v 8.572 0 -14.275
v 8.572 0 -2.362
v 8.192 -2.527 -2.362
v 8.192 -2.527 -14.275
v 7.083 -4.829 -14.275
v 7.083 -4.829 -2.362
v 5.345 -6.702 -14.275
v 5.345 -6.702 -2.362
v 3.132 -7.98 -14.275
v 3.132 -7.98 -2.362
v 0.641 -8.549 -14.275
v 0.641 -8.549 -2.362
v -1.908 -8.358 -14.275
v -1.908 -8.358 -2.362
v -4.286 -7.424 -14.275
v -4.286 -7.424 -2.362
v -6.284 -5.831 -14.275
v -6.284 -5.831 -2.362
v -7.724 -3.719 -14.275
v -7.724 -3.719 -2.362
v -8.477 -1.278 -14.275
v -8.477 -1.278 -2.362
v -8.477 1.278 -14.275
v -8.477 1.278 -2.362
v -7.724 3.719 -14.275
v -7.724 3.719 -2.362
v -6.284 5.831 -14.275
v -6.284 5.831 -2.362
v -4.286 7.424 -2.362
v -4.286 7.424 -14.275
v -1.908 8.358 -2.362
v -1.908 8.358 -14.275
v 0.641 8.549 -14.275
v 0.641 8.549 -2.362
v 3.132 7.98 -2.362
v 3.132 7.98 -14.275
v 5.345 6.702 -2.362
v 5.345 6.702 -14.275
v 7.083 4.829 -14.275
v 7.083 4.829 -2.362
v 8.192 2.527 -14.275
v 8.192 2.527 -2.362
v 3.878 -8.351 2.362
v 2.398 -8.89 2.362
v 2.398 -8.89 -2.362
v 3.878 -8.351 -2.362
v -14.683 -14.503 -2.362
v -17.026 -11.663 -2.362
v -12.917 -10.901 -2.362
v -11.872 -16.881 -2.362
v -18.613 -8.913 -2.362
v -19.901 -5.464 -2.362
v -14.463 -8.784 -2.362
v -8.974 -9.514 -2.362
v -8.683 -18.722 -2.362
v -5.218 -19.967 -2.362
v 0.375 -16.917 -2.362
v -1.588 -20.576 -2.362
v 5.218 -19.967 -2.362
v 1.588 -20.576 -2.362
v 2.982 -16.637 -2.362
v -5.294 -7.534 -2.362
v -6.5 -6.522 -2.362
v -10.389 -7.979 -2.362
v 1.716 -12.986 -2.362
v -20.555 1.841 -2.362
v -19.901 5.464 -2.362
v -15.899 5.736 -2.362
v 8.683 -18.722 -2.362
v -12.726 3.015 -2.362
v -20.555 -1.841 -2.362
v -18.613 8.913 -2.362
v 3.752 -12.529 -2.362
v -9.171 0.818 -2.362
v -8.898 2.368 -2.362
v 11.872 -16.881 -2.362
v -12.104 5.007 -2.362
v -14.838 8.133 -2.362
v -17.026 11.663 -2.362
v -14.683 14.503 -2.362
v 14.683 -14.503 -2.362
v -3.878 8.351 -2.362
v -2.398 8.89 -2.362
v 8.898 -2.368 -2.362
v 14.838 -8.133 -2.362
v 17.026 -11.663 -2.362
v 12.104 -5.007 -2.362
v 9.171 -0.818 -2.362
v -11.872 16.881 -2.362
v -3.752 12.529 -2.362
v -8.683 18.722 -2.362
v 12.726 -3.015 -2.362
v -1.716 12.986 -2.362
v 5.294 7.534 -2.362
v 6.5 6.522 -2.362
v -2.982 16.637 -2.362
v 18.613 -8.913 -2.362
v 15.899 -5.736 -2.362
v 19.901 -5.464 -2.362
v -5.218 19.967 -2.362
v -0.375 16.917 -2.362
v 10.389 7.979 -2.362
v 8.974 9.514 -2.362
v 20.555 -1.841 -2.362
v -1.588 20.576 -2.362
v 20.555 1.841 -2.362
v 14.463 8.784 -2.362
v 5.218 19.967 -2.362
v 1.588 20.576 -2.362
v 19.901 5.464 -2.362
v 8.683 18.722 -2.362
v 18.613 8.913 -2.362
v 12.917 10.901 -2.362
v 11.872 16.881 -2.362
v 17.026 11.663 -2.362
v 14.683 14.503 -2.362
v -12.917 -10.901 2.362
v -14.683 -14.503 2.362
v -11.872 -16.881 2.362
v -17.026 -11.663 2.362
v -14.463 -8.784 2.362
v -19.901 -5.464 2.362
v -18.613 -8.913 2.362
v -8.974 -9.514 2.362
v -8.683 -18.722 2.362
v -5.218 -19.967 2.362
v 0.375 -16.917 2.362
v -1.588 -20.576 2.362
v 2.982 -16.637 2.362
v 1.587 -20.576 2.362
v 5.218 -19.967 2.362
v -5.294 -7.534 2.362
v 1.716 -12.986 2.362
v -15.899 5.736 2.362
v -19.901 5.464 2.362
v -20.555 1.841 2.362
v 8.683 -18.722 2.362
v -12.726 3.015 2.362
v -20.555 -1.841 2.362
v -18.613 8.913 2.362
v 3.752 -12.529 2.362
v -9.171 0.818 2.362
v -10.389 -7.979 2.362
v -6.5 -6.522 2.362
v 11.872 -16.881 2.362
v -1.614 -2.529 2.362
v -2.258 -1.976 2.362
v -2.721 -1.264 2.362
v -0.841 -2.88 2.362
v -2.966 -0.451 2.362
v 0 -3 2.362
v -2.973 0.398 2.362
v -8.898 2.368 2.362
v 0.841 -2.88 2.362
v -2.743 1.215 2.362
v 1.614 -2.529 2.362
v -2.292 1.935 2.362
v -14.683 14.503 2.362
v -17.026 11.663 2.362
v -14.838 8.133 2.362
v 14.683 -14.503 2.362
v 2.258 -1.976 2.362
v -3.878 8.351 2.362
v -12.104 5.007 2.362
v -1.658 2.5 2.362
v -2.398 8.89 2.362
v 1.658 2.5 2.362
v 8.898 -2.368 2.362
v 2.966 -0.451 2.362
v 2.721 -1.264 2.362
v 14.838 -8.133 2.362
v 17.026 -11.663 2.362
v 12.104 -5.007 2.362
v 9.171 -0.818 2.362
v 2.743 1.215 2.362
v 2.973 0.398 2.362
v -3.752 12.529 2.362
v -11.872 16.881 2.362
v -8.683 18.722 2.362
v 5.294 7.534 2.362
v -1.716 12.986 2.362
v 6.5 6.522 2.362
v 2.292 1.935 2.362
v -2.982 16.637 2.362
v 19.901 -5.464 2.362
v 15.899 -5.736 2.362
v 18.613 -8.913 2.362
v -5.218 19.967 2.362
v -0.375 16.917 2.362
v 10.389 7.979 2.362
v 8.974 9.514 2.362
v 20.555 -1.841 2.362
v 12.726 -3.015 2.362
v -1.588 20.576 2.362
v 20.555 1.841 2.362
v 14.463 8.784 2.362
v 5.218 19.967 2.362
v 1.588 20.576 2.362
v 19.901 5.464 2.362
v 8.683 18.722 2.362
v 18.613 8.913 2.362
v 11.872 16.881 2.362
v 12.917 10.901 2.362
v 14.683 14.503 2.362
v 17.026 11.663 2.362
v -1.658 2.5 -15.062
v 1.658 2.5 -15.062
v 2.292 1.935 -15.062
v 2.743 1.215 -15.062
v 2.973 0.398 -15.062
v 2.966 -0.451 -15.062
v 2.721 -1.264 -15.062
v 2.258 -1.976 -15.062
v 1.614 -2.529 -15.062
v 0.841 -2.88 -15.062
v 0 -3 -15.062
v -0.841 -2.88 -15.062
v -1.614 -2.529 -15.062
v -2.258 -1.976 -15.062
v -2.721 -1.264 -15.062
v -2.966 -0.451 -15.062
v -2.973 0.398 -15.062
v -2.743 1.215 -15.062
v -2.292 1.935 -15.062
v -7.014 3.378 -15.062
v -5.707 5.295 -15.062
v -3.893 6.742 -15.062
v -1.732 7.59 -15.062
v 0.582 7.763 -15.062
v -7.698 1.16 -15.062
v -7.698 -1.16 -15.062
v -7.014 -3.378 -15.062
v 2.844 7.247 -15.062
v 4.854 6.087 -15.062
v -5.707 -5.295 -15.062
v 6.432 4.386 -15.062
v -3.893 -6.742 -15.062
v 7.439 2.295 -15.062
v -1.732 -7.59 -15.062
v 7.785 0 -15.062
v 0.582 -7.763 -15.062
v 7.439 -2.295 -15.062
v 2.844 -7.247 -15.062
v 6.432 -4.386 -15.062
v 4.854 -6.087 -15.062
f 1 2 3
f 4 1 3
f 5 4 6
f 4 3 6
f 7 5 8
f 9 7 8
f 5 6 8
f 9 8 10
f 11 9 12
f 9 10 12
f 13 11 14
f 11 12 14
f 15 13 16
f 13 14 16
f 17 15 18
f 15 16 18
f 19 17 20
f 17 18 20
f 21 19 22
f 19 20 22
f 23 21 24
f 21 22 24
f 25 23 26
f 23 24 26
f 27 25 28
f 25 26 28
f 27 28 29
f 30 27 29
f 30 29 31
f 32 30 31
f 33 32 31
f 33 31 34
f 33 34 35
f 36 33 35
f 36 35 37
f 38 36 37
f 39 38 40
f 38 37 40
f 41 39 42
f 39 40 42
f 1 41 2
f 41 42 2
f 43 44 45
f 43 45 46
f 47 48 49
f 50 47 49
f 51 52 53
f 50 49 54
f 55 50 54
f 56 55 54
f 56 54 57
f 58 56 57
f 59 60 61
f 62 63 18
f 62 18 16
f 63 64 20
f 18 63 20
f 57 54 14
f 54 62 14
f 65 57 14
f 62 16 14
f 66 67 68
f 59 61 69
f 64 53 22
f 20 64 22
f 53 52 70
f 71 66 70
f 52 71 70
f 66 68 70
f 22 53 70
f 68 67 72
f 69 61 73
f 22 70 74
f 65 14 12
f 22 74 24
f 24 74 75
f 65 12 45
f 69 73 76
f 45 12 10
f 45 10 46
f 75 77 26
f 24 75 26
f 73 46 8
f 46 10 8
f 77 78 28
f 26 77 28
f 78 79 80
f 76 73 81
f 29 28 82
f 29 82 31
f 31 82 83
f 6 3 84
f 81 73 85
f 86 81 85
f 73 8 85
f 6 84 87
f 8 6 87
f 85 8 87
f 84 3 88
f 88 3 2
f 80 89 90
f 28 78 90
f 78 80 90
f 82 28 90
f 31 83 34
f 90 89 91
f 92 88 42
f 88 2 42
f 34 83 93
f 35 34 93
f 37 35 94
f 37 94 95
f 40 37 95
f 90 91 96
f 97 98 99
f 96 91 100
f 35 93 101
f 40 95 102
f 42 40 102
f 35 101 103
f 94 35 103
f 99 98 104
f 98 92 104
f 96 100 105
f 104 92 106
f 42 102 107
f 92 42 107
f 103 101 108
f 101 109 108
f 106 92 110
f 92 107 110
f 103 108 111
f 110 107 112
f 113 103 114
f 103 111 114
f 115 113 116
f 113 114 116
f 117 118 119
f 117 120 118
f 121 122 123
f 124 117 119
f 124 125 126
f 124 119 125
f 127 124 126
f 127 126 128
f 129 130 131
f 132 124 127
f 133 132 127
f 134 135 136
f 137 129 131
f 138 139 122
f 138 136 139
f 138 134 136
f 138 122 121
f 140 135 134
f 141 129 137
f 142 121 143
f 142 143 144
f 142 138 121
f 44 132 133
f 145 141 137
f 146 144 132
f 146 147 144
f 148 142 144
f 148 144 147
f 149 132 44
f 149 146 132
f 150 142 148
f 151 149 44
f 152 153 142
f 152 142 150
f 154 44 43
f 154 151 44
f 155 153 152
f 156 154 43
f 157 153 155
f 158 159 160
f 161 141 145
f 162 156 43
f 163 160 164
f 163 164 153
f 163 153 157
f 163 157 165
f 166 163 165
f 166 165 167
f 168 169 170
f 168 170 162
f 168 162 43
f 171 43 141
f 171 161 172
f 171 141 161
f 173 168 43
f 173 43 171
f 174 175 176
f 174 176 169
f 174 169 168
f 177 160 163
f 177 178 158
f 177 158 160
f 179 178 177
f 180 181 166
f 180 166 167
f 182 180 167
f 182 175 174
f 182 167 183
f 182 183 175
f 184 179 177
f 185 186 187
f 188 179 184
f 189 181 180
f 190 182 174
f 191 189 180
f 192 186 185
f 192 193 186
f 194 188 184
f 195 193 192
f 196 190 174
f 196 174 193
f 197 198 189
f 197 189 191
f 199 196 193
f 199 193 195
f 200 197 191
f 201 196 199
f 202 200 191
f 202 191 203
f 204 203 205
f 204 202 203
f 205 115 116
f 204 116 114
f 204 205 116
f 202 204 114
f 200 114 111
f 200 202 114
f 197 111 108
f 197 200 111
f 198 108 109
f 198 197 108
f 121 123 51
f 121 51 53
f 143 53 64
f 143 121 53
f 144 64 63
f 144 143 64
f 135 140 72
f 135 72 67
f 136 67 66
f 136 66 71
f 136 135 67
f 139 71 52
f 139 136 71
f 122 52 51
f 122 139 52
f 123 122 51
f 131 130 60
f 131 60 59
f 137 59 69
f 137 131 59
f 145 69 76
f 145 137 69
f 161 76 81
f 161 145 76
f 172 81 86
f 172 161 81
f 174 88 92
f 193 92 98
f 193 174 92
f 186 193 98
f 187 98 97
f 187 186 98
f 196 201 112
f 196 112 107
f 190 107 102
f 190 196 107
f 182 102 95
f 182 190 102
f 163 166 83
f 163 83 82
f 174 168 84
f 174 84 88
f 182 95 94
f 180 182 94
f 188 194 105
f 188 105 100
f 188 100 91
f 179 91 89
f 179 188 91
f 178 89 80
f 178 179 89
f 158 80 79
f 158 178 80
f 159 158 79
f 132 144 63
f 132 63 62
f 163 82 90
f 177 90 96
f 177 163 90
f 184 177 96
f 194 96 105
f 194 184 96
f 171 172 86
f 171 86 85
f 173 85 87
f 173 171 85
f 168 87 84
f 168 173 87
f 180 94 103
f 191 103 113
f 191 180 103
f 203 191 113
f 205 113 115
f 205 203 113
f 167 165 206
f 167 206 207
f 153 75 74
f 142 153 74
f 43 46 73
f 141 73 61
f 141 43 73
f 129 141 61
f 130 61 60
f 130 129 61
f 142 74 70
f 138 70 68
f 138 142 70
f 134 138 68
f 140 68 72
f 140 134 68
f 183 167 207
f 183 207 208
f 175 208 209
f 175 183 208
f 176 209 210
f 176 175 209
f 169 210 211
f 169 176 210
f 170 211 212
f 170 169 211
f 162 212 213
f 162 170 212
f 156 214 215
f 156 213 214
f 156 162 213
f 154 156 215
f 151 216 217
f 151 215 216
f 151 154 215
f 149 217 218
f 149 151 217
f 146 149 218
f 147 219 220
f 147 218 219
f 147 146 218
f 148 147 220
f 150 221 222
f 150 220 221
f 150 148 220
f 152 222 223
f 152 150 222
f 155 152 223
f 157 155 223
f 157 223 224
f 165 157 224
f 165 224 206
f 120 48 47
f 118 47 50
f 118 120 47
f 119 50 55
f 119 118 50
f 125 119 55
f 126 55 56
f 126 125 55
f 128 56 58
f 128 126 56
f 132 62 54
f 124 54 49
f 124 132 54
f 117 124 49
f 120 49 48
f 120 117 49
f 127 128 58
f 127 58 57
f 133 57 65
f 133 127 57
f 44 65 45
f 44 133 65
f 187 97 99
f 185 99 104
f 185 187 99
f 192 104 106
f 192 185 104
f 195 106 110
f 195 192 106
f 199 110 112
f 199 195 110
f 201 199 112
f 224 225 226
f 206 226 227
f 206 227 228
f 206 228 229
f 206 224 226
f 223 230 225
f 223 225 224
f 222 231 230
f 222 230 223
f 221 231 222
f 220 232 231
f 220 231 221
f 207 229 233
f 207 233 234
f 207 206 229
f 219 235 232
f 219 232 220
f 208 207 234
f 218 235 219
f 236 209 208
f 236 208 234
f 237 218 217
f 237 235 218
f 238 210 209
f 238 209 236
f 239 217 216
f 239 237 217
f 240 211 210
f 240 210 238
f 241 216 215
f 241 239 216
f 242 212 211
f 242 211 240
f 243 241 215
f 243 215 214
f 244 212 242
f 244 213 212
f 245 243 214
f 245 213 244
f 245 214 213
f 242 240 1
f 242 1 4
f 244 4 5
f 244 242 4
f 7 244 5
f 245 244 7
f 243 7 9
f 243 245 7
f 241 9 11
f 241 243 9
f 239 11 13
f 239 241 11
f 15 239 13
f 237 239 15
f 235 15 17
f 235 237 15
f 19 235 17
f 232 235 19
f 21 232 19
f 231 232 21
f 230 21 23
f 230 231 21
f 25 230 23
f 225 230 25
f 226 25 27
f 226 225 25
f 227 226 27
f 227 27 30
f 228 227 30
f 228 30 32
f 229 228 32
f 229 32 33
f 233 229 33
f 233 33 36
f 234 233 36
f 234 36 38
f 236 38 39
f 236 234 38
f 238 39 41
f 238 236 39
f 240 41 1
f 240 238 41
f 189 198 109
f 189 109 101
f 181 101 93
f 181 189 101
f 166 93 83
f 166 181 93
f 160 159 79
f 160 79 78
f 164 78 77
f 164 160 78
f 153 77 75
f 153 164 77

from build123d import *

# Parameters (mm, degrees)
SKETCH1_R           = 20.6375
BOSS_EXTRUDE1_DEPTH = 2.3622
CUT_EXTRUDE1_DEPTH  = 30.565736383
SKETCH4_R           = 8.5725
BOSS_EXTRUDE2_DEPTH = 12.7
CIRPATTERN1_COUNT   = 6
CUT_EXTRUDE2_DEPTH  = 34.954416084
CHAMFER1_SIZE       = 0.7874


with BuildPart() as part:
    # Sketch1 → Boss-Extrude1 (new, symmetric)
    with BuildSketch(Plane.XY):
        Circle(SKETCH1_R)
    extrude(amount=BOSS_EXTRUDE1_DEPTH, both=True)

    # Sketch2 → Cut-Extrude1 (cut, through all)
    with BuildSketch(Plane.XY.offset(2.3622)):
        with BuildLine():
            Line((-2.397761805, 8.89), (-3.877589744, 8.351386678))
            ThreePointArc((-3.877589744, 8.351386678), (-3.446754472, 14.597661325), (-1.5875, 20.576351717))
            ThreePointArc((-1.5875, 20.576351717), (0, 20.6375), (1.5875, 20.576351717))
            ThreePointArc((1.5875, 20.576351717), (-1.12604651, 14.979021398), (-2.397761805, 8.89))
        make_face()
    cut_extrude1 = extrude(amount=-CUT_EXTRUDE1_DEPTH, mode=Mode.SUBTRACT)

    # Sketch4 → Boss-Extrude2 (add)
    with BuildSketch(Plane(origin=(0, 0, -2.3622), x_dir=(-1, 0, 0), z_dir=(0, 0, -1))):
        with Locations(Location((0, 0, 0), (0, 0, 180))):
            Circle(SKETCH4_R)
    extrude(amount=BOSS_EXTRUDE2_DEPTH)

    # CirPattern1: Cut-Extrude1 ×6 about axis
    cirpattern1_axis = Axis((0, 0, 0), (0, 0, 1))
    for i in range(1, CIRPATTERN1_COUNT):
        add(cut_extrude1.rotate(cirpattern1_axis, i * 360 / CIRPATTERN1_COUNT), mode=Mode.SUBTRACT)

    # Sketch3 → Cut-Extrude2 (cut, through all)
    with BuildSketch(Plane.XY.offset(2.3622)):
        with BuildLine():
            Line((-1.658312395, 2.5), (1.658312395, 2.5))
            ThreePointArc((1.658312395, 2.5), (0, -3), (-1.658312395, 2.5))
        make_face()
    extrude(amount=-CUT_EXTRUDE2_DEPTH, mode=Mode.SUBTRACT)

    # Chamfer1
    chamfer1_edges = [part.edges().sort_by_distance(p)[0] for p in [
        (-8.5725, 0, -15.0622),
    ]]
    chamfer(chamfer1_edges, length=CHAMFER1_SIZE)


solid = part.part
